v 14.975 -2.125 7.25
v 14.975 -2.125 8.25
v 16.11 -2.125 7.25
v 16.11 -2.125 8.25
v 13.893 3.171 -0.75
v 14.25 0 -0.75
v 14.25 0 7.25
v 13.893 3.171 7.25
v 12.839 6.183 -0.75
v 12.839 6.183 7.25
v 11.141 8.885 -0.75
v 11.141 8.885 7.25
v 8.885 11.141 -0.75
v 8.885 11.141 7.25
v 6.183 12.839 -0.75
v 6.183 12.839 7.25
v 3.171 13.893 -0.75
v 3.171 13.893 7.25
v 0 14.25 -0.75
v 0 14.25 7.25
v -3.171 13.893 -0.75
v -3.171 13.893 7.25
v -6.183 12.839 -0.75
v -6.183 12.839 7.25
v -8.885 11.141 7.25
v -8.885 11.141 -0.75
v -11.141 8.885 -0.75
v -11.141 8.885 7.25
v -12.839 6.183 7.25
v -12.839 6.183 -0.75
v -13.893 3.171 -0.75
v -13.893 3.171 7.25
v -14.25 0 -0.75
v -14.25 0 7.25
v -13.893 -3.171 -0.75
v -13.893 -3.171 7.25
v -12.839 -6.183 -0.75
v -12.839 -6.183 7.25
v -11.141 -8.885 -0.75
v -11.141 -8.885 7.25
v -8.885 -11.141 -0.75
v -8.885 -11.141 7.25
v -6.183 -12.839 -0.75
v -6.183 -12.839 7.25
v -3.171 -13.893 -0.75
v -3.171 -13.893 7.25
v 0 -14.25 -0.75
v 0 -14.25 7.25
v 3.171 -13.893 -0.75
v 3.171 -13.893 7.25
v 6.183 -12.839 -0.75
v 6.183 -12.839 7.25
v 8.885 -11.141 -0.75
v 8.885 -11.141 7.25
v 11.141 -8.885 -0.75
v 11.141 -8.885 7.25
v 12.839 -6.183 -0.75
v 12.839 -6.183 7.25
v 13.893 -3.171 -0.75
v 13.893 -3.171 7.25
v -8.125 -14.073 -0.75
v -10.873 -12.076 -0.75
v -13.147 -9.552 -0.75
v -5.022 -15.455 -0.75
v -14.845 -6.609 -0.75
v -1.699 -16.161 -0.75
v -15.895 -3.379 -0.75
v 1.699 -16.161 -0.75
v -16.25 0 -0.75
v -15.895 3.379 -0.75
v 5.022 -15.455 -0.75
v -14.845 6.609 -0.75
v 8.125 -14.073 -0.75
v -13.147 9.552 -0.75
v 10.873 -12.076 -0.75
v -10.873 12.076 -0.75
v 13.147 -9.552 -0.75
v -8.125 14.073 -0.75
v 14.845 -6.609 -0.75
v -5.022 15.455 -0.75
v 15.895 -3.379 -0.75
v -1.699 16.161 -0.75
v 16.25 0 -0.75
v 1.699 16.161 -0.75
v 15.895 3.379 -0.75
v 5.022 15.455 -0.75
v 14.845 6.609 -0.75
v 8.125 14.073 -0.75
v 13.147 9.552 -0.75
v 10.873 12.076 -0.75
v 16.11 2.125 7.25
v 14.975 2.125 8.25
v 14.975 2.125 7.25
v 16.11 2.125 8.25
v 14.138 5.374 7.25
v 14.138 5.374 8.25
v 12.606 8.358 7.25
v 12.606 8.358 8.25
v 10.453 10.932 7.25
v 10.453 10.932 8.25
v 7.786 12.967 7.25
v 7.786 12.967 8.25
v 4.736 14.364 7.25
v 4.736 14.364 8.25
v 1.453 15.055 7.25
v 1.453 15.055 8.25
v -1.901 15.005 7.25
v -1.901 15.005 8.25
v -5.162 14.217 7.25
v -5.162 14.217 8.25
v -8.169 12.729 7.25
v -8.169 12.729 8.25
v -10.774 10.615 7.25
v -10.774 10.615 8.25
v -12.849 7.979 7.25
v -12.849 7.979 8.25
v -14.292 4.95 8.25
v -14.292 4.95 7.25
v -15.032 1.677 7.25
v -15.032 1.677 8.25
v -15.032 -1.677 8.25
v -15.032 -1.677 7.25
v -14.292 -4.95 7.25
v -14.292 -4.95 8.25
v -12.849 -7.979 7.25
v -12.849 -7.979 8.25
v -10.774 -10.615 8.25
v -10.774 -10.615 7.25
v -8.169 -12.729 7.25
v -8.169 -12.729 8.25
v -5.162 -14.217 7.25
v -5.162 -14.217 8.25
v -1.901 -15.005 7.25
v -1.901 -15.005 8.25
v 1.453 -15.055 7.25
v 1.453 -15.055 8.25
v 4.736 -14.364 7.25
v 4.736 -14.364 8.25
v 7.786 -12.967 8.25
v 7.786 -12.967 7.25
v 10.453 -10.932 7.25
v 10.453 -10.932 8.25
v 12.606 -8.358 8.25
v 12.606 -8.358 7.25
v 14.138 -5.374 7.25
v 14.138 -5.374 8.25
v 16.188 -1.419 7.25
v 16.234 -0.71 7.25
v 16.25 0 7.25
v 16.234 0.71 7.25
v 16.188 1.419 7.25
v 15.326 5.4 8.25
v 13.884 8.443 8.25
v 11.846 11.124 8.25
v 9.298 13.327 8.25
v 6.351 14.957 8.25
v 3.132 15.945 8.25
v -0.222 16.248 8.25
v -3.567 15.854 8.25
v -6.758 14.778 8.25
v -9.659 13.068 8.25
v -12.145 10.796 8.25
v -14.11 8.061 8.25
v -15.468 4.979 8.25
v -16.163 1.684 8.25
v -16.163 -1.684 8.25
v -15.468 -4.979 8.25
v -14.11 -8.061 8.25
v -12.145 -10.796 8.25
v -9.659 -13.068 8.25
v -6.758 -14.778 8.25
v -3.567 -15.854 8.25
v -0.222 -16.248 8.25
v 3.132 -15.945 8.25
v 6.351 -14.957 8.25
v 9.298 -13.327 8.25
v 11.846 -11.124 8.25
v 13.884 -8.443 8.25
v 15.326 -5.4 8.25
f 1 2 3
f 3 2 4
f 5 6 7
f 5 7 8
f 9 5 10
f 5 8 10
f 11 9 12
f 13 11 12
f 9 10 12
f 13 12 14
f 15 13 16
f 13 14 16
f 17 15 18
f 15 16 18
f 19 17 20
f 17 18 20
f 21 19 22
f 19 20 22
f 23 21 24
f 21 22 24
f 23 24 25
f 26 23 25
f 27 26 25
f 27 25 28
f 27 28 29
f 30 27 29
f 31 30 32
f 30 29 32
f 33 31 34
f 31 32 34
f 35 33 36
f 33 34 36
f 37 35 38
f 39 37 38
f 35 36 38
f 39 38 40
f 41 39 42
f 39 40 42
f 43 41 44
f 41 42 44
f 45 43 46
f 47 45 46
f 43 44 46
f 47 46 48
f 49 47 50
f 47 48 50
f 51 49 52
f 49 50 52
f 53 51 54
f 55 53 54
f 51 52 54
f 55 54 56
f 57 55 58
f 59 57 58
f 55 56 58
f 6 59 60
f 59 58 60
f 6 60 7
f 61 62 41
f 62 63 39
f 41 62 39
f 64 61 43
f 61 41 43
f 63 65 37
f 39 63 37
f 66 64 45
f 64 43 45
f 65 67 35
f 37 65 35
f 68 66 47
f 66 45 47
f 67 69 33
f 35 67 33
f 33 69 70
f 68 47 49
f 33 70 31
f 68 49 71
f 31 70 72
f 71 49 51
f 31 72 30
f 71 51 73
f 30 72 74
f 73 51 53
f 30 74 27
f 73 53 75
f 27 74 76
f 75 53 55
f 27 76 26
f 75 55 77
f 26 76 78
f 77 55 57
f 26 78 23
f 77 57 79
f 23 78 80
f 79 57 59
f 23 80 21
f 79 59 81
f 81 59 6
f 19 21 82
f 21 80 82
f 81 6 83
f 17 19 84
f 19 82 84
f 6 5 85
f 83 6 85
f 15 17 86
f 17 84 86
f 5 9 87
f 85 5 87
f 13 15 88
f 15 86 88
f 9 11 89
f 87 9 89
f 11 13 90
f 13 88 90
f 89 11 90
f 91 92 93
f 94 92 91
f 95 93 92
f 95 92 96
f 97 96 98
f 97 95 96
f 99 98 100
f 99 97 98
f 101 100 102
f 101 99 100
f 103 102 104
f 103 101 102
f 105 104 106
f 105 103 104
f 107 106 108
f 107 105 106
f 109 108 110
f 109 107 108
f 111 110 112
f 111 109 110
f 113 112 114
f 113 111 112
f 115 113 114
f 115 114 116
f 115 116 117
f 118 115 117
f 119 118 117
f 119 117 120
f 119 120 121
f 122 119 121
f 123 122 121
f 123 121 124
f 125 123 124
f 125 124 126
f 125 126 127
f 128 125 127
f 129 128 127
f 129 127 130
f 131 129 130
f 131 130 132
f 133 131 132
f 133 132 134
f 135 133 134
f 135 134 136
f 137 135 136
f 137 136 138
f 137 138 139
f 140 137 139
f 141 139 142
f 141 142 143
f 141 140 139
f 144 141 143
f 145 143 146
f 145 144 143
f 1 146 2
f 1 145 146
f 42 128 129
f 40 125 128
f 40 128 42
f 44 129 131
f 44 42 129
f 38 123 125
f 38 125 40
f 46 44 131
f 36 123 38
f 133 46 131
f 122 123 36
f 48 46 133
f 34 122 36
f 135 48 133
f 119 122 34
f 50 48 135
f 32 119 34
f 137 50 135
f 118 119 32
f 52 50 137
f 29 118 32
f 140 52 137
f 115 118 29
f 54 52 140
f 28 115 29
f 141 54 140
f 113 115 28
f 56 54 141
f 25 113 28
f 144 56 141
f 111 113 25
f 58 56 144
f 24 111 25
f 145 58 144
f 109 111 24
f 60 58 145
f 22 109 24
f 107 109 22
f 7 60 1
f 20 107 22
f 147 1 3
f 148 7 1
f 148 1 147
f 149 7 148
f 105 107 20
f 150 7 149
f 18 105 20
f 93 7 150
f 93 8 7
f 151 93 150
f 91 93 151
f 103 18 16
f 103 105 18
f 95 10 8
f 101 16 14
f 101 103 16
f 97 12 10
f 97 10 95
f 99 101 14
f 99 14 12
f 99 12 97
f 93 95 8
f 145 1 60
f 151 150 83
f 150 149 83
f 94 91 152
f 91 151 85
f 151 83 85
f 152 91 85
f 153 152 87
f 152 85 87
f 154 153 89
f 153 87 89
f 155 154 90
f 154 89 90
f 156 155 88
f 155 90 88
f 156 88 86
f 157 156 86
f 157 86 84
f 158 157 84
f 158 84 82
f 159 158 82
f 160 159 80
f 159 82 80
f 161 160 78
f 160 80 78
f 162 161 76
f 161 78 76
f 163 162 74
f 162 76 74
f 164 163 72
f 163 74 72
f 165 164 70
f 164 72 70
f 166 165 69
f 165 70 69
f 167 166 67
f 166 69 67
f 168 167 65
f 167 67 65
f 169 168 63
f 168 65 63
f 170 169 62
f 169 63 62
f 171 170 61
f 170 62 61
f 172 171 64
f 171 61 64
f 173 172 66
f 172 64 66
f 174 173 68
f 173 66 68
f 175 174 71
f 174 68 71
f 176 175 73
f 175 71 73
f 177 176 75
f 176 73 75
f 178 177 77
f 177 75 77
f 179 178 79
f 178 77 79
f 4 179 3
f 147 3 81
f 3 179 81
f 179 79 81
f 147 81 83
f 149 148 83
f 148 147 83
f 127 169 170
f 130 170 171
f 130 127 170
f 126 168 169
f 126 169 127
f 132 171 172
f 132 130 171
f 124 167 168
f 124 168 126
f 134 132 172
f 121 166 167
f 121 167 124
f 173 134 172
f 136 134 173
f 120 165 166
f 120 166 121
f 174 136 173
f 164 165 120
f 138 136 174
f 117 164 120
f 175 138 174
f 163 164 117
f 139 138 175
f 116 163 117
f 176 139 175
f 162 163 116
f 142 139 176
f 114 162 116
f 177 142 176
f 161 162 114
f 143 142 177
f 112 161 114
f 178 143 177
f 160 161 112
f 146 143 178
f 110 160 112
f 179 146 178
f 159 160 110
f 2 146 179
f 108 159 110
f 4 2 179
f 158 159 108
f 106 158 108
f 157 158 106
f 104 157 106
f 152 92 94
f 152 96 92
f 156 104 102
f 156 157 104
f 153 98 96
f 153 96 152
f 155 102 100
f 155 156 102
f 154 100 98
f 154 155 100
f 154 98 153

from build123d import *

# Parameters (mm, degrees)
F0_R          = 16.25
F0_R_2        = 14.25
F1_DEPTH      = 7.25
F1_DEPTH_BACK = 0.75
F2_R          = 16.25
F2_R_2        = 15.125
F3_DEPTH      = 1
F4_W          = 4
F4_H          = 4.25
F5_DEPTH      = 1


with BuildPart() as f1:
    # F0 (on Top) → F1 (new body, two sides)
    with BuildSketch(Plane.XY) as f1_sk:
        Circle(F0_R)
        Circle(F0_R_2, mode=Mode.SUBTRACT)
    extrude(amount=F1_DEPTH)
    extrude(f1_sk.sketch, amount=-F1_DEPTH_BACK)

    # F2 (on face) → F3 (join)
    with BuildSketch(Plane.XY.offset(7.25)):
        Circle(F2_R)
        Circle(F2_R_2, mode=Mode.SUBTRACT)
    extrude(amount=F3_DEPTH)

    # F4 (on face) → F5 (cut)
    with BuildSketch(Plane.XY.offset(8.25)):
        with Locations((15.125, 0)):
            Rectangle(F4_W, F4_H)
    extrude(amount=-F5_DEPTH, mode=Mode.SUBTRACT)


solid = f1.part
